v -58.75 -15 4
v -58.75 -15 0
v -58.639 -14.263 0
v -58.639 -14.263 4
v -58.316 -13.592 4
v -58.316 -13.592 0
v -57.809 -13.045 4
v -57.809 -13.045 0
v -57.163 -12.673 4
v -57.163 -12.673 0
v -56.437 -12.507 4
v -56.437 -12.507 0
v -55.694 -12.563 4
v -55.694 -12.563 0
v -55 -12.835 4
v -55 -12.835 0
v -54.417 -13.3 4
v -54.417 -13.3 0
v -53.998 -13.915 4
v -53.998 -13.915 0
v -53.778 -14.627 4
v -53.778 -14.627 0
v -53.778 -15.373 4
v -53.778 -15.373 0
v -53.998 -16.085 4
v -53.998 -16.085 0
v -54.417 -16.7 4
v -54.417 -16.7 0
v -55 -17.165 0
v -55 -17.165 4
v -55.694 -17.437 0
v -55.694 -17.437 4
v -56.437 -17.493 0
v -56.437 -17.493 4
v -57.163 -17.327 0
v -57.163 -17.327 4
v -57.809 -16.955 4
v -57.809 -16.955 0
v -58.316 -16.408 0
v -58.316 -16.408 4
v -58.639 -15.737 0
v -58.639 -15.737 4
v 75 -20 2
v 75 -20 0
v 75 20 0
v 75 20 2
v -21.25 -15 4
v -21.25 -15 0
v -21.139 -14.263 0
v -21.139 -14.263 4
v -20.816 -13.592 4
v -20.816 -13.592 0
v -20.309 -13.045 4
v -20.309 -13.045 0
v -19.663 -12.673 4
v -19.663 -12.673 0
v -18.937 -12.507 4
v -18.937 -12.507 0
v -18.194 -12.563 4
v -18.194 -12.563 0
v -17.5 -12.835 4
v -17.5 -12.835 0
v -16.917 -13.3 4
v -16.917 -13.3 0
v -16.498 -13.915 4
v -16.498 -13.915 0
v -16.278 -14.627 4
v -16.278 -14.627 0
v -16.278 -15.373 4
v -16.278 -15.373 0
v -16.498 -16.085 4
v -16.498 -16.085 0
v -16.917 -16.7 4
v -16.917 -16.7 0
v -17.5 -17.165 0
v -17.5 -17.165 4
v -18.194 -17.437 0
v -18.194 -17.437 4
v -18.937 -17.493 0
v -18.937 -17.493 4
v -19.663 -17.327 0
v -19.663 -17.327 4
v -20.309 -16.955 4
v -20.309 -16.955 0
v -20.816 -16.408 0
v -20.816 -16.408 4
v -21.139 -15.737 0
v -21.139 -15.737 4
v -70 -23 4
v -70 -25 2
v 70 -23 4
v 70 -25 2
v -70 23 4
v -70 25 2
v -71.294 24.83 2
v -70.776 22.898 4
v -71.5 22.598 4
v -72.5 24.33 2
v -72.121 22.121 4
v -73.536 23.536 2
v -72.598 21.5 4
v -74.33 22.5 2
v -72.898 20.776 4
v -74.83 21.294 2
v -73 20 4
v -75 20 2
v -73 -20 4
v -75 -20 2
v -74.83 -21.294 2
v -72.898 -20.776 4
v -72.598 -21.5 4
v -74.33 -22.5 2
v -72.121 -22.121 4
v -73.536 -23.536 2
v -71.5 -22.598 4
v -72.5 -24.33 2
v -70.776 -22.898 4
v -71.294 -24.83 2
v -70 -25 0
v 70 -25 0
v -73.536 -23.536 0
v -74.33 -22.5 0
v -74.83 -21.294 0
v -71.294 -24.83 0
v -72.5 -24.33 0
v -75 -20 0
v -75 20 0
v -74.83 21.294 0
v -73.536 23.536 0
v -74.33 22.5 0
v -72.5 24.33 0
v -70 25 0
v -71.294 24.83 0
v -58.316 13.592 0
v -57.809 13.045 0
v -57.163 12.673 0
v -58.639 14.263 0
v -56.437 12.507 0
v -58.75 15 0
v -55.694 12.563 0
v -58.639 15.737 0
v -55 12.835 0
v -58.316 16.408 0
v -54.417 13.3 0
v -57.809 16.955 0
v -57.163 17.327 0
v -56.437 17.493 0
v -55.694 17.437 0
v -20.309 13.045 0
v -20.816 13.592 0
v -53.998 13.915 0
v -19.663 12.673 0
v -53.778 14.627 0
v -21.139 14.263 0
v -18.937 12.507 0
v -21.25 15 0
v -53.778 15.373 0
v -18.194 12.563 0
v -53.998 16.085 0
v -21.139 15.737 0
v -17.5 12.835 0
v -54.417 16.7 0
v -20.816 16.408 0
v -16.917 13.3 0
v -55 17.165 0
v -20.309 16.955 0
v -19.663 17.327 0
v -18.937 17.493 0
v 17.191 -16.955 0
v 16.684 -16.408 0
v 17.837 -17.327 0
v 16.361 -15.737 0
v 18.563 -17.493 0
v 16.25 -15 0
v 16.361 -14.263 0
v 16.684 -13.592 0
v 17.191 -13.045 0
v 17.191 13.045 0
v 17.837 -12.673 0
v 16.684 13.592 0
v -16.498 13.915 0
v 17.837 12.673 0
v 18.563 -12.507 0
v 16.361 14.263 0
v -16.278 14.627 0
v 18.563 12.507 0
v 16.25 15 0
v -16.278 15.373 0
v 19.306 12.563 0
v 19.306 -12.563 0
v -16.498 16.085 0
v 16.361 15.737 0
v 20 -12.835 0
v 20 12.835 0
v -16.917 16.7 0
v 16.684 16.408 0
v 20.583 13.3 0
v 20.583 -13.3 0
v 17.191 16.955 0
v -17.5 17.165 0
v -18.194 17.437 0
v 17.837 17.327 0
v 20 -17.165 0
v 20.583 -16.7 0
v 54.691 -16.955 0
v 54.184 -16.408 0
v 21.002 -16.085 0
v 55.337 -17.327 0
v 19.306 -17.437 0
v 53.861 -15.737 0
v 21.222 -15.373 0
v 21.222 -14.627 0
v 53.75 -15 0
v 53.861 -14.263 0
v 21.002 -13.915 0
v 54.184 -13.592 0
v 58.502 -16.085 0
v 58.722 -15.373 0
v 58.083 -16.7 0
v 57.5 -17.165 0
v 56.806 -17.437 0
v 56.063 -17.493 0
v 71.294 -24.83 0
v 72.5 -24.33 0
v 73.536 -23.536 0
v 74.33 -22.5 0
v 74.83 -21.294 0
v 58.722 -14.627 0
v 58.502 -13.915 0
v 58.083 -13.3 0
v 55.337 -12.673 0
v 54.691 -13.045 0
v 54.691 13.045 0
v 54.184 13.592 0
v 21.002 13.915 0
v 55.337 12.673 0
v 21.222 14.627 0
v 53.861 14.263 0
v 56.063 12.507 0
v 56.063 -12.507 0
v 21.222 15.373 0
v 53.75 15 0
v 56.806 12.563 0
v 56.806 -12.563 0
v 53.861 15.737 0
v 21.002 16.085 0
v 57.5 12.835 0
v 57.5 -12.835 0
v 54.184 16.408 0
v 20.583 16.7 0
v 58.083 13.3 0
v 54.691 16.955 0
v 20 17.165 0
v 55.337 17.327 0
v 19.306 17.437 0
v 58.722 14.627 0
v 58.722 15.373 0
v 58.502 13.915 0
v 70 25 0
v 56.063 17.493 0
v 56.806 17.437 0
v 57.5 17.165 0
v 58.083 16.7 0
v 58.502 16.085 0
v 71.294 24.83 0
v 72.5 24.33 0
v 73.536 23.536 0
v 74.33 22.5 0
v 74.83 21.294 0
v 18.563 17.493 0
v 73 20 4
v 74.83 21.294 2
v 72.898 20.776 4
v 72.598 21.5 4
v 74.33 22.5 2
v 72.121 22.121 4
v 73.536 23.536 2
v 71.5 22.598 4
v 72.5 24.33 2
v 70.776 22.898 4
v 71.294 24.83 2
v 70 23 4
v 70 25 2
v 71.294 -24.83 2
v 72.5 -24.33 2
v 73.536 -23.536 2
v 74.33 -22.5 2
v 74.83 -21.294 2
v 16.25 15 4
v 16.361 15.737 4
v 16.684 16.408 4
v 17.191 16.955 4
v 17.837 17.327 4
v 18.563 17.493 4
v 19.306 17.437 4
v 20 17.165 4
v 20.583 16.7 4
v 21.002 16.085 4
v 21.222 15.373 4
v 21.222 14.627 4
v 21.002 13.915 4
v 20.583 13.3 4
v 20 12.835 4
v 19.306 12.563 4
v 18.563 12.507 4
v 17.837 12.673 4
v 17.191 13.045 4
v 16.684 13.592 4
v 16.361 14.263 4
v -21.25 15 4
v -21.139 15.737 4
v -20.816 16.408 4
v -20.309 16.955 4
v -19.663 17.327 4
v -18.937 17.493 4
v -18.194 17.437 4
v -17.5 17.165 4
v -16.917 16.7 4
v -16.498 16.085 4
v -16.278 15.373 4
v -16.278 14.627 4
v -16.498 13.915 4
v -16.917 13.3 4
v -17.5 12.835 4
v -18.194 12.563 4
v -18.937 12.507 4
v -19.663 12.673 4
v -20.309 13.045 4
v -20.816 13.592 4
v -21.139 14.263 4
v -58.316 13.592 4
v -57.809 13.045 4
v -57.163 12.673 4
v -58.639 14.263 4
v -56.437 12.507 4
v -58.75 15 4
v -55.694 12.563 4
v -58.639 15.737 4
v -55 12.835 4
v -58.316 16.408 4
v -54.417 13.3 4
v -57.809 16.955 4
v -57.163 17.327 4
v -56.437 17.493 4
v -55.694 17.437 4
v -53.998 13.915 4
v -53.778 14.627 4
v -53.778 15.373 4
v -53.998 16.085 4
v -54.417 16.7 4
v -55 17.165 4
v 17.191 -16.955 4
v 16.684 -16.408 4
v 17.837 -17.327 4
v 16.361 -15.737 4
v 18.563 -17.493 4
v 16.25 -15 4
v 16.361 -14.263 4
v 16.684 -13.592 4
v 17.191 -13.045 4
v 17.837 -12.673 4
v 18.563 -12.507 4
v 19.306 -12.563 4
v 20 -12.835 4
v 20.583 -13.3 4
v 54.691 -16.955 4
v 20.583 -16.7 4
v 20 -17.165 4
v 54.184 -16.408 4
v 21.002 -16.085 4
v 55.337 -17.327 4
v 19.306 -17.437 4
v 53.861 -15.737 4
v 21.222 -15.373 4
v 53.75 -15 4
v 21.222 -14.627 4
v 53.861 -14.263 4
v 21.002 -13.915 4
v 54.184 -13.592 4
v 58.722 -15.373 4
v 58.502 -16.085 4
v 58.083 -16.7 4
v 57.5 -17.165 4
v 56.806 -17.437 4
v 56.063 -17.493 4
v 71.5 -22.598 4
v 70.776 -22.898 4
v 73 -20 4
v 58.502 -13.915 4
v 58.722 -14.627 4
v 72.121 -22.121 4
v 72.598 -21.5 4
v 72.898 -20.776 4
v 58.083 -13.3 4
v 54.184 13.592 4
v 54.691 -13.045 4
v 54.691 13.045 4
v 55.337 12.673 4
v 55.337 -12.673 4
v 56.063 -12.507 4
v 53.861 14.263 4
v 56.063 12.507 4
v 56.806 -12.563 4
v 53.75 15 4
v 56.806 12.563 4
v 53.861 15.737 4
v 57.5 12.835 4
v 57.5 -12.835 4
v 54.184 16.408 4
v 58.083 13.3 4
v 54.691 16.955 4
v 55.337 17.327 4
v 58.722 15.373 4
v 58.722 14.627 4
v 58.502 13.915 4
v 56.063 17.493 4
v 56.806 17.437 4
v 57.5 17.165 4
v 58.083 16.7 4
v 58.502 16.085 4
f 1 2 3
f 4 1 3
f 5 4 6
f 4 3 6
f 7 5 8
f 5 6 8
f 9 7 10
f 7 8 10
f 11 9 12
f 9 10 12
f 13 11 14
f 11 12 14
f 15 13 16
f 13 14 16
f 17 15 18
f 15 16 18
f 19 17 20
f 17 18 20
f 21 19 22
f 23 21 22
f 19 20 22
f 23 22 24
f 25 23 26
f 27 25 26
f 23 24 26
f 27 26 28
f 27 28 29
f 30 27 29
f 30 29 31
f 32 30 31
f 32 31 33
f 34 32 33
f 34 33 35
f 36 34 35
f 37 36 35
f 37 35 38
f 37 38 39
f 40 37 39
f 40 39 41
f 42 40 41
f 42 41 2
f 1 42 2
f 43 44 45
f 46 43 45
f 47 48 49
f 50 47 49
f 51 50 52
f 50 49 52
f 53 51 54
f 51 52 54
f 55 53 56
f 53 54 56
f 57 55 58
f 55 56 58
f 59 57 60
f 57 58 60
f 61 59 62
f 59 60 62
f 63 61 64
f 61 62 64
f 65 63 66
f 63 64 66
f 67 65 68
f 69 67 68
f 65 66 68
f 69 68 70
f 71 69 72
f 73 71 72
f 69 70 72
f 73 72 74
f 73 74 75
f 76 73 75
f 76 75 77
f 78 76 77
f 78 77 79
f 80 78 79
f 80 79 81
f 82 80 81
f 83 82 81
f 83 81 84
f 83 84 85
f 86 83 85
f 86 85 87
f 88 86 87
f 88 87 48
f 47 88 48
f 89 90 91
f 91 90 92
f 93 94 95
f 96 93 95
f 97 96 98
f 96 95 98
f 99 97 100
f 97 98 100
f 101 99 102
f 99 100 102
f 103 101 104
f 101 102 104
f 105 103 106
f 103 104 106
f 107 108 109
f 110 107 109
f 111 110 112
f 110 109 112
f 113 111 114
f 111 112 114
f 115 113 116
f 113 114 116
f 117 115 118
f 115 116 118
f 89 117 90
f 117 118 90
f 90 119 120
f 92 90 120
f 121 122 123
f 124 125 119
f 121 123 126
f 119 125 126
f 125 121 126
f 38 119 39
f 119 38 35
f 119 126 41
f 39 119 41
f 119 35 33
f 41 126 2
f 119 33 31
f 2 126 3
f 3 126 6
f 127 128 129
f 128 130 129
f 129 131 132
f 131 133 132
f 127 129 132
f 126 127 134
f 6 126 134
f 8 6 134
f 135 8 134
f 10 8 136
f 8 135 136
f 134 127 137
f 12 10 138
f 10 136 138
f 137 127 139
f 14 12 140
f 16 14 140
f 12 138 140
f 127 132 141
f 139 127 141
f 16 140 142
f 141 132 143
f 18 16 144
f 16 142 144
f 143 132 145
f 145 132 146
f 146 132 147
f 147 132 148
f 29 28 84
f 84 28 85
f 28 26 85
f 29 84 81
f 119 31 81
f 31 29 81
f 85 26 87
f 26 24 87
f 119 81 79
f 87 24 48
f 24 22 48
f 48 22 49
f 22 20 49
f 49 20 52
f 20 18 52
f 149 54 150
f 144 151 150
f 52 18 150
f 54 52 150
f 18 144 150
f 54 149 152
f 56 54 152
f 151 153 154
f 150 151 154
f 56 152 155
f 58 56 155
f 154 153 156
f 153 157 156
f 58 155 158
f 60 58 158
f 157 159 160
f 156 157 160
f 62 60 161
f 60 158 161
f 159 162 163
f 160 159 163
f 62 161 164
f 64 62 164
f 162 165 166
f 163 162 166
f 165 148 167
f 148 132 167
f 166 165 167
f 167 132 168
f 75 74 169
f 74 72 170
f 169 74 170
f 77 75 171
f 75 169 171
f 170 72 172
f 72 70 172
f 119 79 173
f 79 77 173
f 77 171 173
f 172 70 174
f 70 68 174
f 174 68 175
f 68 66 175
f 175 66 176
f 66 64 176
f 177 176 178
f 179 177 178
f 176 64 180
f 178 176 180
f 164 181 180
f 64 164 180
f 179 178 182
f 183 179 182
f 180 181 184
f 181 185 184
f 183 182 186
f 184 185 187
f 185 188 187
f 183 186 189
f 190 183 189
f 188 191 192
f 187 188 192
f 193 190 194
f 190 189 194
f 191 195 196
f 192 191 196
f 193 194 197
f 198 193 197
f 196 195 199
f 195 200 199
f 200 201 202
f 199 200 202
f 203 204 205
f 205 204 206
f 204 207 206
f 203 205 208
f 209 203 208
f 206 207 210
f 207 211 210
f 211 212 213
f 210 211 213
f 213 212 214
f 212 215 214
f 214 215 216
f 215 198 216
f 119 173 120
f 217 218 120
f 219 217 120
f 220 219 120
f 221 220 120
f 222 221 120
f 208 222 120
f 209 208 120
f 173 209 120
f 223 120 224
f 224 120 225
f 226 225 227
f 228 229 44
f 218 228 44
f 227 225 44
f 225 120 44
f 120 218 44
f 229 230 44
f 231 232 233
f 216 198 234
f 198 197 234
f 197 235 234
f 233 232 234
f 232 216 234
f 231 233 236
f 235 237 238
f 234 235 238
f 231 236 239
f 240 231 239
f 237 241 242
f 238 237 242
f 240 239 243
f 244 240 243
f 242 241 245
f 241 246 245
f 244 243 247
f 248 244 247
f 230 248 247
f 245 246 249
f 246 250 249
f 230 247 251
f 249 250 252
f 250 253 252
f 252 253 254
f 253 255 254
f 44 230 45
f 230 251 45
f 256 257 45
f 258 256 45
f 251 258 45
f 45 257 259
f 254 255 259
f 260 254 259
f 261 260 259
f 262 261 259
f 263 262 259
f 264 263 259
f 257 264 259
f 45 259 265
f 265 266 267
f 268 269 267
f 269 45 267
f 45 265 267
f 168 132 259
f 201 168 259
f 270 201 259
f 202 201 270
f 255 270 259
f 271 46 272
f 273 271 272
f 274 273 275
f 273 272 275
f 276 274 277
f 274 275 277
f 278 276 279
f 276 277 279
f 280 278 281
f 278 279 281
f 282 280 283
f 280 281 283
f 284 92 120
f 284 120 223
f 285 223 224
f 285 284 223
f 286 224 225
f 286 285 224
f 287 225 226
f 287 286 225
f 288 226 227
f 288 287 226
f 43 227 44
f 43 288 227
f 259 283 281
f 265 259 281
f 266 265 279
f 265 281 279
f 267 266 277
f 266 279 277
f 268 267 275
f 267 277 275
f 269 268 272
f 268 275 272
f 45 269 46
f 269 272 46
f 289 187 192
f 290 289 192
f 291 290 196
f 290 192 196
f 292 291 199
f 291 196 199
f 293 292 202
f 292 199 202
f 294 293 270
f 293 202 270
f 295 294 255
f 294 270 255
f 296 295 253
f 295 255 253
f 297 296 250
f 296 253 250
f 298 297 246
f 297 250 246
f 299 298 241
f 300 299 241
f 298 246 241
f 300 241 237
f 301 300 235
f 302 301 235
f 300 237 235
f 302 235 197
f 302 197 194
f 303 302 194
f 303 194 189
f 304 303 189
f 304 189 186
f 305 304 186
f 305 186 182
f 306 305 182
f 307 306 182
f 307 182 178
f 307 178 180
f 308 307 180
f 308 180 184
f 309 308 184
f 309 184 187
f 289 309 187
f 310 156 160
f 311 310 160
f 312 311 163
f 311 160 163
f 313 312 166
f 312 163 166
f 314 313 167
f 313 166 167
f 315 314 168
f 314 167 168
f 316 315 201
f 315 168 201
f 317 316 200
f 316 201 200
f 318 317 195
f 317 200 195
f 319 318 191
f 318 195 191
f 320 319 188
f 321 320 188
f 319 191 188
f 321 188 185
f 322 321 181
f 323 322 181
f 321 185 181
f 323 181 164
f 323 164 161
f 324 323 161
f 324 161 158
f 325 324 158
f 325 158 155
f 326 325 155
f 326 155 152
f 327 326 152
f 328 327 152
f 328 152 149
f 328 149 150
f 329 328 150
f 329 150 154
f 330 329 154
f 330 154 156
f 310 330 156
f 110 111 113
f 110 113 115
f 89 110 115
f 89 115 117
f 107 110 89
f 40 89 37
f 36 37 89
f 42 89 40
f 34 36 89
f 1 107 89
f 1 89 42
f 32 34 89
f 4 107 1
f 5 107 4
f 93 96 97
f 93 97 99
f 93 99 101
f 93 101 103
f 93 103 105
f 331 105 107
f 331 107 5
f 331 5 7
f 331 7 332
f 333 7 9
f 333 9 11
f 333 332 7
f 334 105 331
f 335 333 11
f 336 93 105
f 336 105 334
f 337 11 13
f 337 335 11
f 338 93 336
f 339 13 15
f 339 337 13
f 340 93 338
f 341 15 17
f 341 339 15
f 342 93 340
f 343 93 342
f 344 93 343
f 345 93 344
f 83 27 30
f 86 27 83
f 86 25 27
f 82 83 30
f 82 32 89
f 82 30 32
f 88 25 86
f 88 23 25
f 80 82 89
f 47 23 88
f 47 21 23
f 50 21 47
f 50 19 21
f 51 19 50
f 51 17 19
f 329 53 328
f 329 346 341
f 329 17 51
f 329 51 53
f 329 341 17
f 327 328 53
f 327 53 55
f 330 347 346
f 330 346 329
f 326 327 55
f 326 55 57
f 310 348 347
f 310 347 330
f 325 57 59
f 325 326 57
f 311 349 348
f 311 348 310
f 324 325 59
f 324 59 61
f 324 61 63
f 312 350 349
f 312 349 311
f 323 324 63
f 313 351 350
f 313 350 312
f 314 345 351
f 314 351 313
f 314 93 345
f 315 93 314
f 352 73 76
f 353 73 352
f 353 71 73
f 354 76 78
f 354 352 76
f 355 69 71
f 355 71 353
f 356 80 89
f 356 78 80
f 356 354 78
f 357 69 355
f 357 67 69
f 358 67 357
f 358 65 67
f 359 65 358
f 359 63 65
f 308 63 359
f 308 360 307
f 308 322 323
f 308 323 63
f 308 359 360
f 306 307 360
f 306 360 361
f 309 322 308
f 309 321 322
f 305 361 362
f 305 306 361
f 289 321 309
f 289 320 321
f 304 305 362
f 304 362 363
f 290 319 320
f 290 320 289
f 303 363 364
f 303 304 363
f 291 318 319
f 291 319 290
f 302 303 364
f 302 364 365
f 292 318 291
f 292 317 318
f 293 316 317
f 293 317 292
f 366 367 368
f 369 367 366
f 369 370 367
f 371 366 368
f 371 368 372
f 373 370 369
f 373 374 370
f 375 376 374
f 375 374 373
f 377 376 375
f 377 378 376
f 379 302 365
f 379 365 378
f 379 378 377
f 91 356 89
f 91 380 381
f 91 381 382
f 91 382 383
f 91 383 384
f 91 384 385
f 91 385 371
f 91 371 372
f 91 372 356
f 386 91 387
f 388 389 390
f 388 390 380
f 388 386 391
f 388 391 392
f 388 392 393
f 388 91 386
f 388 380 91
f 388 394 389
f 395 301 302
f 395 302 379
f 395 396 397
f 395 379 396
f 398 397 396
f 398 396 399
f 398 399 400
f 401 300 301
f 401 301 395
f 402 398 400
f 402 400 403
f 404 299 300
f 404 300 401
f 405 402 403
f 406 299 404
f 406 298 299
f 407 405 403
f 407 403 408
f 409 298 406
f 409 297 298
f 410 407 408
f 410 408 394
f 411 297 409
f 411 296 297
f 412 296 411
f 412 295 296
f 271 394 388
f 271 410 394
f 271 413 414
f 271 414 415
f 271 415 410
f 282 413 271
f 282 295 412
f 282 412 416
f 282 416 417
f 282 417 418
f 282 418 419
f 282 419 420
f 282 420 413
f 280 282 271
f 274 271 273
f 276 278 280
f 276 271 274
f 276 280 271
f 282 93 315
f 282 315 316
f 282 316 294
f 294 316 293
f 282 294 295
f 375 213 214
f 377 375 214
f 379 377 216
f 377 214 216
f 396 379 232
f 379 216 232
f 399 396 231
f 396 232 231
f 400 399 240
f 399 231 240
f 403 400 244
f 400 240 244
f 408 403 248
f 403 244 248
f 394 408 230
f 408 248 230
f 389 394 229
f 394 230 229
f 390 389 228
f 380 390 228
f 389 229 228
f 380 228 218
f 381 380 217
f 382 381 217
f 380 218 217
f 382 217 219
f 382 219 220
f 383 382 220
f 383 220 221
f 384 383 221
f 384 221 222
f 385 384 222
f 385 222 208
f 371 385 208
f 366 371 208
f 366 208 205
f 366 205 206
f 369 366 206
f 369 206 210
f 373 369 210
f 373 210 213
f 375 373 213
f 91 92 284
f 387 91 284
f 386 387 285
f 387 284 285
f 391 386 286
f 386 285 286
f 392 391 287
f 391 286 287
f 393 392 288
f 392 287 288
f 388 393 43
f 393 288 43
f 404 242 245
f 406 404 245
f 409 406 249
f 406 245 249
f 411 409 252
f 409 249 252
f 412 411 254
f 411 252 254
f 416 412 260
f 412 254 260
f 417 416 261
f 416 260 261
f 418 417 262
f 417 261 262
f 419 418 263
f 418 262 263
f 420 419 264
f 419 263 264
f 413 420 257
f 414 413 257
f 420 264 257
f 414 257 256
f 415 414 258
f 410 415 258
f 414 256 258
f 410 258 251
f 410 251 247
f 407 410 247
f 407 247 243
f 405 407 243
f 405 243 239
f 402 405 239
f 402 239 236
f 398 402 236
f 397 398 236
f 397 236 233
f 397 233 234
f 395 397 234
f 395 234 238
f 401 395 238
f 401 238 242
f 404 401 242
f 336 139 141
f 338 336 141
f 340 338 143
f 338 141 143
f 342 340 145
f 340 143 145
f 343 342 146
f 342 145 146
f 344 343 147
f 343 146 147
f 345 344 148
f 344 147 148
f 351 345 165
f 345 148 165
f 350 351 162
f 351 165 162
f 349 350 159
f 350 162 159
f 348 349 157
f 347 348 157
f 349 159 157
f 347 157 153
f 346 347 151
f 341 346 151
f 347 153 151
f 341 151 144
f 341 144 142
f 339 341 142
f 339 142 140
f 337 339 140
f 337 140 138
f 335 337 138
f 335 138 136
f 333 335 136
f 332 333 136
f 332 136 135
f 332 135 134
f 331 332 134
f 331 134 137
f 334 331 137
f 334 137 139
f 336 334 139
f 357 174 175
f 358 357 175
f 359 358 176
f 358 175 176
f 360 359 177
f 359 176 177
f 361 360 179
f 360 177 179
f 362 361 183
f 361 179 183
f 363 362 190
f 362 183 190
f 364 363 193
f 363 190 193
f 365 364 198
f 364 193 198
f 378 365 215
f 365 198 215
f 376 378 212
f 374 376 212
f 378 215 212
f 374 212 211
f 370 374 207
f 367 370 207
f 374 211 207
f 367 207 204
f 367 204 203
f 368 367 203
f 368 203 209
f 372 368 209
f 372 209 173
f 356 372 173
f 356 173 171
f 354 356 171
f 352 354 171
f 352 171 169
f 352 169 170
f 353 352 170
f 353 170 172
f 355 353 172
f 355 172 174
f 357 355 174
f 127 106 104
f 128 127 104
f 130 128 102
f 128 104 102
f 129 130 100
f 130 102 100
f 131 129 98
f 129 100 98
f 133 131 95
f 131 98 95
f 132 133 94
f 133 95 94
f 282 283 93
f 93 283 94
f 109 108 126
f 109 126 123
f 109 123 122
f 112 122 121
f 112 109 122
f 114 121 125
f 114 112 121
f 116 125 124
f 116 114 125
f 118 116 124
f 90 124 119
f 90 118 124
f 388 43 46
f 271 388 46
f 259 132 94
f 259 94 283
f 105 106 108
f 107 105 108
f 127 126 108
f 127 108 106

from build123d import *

# Parameters (mm, degrees)
F0_W     = 150
F0_H     = 50
F1_DEPTH = 4
F3_D     = 5
F4_R     = 5
F5_SIZE  = 2


with BuildPart() as f1:
    # F0 (on Top) → F1 (new body)
    with BuildSketch(Plane.XY):
        Rectangle(F0_W, F0_H)
    extrude(amount=F1_DEPTH)

    # F3 (through all)
    with Locations(Plane.XY.offset(4)):
        with Locations((-56.25, 15), (-56.25, -15), (-18.75, -15), (-18.75, 15), (18.75, 15), (18.75, -15), (56.25, -15), (56.25, 15)):
            Hole(F3_D / 2)

    # F4
    f4_edges = [f1.edges().sort_by_distance(p)[0] for p in [
        (-75, 25, 2),
        (-75, -25, 2),
        (75, -25, 2),
        (75, 25, 2),
    ]]
    fillet(f4_edges, radius=F4_R)

    # F5
    f5_edges = [f1.edges().sort_by_distance(p)[0] for p in [
        (0, -25, 4),
    ]]
    chamfer(f5_edges, length=F5_SIZE)


solid = f1.part
